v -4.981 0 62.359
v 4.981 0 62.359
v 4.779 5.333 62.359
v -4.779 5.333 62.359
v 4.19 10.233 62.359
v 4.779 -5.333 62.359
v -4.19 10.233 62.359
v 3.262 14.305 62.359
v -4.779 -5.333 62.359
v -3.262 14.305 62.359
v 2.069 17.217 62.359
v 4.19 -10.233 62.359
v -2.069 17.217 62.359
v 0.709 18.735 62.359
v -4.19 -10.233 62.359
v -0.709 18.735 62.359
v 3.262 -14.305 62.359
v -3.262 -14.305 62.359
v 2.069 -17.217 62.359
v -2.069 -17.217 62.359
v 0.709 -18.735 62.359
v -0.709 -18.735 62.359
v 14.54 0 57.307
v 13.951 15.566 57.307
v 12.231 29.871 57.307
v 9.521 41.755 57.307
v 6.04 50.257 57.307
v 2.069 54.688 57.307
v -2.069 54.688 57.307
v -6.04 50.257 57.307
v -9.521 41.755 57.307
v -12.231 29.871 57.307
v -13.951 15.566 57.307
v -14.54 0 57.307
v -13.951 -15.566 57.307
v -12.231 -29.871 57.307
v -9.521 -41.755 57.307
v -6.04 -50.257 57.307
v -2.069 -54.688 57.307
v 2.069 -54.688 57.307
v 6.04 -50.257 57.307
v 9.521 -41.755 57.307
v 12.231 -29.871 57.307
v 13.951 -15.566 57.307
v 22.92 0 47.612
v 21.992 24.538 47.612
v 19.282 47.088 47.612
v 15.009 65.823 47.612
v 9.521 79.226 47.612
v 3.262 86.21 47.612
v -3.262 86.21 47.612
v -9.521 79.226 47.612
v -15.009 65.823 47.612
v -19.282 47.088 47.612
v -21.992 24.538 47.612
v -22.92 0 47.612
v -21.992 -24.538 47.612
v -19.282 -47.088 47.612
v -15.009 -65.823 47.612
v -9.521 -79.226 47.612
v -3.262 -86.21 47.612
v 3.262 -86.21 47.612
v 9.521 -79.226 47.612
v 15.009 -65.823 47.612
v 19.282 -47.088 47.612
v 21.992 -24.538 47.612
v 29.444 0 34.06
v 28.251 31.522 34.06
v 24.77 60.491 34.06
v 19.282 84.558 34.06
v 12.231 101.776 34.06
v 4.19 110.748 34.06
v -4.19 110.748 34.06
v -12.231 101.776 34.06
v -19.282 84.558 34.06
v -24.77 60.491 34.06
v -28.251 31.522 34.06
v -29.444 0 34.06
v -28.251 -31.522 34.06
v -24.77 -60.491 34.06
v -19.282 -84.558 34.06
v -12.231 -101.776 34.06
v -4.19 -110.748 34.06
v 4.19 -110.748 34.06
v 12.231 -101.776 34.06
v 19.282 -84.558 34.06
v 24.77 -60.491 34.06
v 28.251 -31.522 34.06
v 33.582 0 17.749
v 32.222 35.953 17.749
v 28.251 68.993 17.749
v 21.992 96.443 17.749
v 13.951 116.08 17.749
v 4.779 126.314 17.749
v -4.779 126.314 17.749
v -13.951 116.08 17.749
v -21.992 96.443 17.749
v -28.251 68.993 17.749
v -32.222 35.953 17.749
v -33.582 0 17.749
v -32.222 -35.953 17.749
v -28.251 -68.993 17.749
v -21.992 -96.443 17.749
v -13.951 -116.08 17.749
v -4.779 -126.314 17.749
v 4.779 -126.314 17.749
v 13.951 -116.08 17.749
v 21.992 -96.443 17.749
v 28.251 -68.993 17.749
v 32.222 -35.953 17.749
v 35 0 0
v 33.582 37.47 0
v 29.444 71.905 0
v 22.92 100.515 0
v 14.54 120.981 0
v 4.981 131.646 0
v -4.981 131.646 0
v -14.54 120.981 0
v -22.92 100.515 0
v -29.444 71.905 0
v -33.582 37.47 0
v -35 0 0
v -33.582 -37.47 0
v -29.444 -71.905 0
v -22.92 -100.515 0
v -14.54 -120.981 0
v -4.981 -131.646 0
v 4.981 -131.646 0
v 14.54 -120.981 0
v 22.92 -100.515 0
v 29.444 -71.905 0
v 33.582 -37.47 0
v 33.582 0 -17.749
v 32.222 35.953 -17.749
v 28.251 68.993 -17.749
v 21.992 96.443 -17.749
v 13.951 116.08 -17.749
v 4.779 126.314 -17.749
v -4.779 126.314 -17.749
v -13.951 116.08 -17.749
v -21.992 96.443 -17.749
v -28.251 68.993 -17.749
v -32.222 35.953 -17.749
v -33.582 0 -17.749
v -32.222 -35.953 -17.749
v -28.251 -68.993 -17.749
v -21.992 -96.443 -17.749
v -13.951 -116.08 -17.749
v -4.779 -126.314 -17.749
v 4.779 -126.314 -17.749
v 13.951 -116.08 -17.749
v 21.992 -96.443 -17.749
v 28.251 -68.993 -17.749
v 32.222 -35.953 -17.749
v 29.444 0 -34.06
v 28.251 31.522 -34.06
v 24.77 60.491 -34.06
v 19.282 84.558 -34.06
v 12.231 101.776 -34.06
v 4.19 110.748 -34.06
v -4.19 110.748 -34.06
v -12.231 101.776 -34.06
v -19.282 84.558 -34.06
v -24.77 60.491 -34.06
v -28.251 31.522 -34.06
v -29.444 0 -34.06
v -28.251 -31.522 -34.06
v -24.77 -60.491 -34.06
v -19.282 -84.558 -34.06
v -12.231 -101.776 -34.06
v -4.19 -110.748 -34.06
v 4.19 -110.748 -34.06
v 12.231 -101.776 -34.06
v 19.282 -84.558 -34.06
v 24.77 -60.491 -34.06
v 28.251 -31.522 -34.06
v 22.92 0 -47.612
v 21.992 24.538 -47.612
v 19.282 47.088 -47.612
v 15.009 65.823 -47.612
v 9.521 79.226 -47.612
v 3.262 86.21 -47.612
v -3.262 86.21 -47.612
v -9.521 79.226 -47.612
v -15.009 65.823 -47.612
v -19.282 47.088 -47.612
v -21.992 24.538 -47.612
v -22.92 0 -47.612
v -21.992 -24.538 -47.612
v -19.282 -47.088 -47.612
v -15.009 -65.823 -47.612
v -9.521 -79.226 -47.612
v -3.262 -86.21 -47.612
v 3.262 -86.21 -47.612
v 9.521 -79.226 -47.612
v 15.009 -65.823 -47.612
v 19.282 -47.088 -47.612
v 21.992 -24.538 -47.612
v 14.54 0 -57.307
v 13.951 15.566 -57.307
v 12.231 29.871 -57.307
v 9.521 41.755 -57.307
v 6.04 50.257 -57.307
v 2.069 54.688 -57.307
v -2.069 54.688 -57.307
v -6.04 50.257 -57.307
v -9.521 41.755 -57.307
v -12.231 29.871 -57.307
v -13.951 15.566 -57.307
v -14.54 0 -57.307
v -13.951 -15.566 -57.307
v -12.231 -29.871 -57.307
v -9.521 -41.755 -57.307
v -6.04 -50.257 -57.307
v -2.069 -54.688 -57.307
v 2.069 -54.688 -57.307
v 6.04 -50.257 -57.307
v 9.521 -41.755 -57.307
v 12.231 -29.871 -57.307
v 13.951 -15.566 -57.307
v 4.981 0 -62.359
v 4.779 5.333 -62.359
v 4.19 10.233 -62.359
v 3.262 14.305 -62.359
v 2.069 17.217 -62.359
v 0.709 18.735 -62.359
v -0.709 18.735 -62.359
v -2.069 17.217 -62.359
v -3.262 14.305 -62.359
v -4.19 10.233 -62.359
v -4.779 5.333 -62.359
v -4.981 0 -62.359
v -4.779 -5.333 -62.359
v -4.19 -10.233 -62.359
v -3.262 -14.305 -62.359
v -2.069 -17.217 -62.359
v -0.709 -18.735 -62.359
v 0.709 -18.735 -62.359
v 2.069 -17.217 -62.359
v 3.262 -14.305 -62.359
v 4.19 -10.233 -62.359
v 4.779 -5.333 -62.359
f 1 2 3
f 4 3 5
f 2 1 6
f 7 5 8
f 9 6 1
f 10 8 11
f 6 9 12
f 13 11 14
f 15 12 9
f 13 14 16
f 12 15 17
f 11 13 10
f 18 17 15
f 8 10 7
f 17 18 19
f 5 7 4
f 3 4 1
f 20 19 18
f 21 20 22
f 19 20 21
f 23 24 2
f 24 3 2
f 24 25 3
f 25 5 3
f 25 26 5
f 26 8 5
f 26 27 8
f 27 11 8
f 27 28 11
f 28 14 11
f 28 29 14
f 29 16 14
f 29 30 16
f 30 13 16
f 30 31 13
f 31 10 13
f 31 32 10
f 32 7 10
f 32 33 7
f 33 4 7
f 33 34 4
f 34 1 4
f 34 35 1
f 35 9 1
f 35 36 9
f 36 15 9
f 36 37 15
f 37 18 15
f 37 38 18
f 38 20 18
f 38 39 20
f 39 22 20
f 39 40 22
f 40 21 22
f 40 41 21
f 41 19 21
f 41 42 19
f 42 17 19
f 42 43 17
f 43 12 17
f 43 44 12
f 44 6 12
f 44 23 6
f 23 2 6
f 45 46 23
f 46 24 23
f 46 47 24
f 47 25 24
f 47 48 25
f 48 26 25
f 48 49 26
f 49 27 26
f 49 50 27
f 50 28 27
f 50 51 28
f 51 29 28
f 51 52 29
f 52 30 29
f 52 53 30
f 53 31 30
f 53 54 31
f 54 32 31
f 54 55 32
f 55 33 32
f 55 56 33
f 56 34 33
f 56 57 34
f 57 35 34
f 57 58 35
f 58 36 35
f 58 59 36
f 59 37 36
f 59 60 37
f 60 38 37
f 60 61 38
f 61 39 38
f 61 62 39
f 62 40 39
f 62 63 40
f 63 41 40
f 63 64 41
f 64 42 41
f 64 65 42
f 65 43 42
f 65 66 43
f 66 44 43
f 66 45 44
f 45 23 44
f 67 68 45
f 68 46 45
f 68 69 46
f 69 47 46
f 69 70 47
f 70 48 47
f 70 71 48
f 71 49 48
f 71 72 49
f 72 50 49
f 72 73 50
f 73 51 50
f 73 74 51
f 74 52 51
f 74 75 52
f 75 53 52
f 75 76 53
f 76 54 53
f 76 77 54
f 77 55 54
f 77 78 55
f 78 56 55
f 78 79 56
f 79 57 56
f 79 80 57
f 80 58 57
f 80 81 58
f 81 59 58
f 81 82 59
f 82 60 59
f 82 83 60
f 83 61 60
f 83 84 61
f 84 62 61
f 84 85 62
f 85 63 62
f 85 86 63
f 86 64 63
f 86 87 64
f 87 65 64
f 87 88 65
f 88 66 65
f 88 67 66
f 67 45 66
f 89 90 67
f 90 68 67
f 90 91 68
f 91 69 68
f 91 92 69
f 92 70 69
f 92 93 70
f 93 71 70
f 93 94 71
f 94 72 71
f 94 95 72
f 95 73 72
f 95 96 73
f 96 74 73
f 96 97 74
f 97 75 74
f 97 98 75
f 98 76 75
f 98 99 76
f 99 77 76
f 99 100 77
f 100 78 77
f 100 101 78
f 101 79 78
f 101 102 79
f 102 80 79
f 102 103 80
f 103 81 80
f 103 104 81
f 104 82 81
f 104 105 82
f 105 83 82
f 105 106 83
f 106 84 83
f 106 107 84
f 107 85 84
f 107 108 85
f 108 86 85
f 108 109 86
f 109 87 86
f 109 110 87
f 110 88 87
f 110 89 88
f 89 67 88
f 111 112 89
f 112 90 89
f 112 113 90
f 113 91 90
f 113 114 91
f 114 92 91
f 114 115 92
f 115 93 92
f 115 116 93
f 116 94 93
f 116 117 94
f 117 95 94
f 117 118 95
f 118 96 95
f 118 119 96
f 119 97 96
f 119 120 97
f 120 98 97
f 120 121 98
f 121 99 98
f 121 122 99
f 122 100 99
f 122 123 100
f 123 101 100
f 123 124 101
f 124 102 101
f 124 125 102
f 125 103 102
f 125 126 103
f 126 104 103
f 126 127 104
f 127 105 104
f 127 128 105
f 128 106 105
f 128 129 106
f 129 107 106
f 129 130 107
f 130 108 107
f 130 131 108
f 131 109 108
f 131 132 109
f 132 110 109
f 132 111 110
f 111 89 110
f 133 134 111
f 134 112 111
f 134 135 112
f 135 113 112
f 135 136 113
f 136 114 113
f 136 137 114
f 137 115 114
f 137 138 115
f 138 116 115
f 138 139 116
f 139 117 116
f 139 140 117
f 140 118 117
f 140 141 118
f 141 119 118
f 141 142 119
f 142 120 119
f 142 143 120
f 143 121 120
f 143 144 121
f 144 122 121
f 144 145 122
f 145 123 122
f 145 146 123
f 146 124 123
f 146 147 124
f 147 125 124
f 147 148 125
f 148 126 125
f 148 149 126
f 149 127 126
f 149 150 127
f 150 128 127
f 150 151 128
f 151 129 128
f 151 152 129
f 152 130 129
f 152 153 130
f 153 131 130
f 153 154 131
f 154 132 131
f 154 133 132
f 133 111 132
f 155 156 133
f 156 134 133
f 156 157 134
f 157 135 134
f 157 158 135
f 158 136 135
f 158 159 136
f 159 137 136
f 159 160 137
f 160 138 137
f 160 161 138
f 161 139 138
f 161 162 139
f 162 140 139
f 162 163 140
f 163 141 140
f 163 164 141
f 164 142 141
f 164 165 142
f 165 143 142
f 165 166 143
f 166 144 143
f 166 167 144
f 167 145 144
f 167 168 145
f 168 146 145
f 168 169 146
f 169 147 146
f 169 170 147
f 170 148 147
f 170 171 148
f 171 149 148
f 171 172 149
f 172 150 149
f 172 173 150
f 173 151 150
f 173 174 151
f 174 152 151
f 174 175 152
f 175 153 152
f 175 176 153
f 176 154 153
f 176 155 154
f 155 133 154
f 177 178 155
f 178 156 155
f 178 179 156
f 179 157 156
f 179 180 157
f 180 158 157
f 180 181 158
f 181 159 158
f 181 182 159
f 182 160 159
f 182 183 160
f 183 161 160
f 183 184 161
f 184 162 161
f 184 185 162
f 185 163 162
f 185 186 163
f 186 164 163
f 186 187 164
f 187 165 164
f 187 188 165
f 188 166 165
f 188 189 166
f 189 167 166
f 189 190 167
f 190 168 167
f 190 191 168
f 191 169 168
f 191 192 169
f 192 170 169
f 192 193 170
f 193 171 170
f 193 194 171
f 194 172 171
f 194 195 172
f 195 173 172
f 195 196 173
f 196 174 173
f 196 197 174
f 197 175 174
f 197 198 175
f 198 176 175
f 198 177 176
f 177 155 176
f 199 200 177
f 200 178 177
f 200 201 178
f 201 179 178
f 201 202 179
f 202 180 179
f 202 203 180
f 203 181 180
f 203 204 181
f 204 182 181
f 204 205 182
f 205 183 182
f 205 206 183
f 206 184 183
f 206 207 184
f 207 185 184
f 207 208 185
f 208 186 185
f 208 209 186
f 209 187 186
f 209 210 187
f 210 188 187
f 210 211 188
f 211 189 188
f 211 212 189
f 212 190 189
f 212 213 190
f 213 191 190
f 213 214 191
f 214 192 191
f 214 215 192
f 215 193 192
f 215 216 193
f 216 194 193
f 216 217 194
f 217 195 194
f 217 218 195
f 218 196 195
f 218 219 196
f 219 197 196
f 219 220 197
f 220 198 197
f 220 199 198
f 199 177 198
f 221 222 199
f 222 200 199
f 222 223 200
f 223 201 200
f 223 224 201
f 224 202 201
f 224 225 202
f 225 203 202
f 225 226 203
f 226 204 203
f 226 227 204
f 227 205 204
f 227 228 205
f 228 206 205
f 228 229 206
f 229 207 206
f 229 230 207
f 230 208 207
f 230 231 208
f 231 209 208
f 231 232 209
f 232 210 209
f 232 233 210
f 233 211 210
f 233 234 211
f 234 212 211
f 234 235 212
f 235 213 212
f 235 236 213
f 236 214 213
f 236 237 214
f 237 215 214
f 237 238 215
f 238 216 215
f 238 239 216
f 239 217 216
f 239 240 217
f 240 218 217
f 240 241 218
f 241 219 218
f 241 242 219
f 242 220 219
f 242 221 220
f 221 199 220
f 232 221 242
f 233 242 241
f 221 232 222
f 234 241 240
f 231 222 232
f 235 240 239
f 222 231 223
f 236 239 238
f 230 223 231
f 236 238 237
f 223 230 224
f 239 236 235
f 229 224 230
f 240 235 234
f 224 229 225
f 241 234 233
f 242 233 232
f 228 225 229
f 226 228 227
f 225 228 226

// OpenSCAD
// Generated by SolidPython 1.0.1 on 2020-07-29 00:46:47


scale(v = [5, 19, 9]) {
	sphere(r = 7);
}
/***********************************************
*********      SolidPython code:      **********
************************************************
 
# import packages: SolidPython
from solid import *
from solid.utils import *
from itertools import chain, combinations, permutations


class Resize:

    def __init__(self, scad_file):
        self.scad_file = scad_file
        #self.scad_file = import_scad(scad_file)
        # cone/cylinder param:
        self.r1 = 0
        self.r2 = 0
        self.h = 0
        # rectangular prism param:
        self.w = 0
        self.l = 0
        # ellipse param:
        self.r = 0

    # import OpenScad code (file name corresponds to shape)


    # classify shape + parameters
    def assign(self, param1, param2, param3):
        if self.scad_file == 'cone.scad':
            self.r1 = param1
            self.r2 = param2
            self.h = param3
        elif self.scad_file == 'cylinder.scad':
            self.r1 = param1
            self.r2 = param2
            self.h = param3
        elif self.scad_file == 'rectangularPrism.scad':
            self.h = param1
            self.l = param2
            self.w = param3
        else:
            self.r = param1
            self.h = param2

    # resize parameters
    def iterate(self):
        x = range(3, 20, 2)
        i = 1
        if self.scad_file == 'cone.scad':
            tempList = list(permutations(x, 2))
            for temp in tempList:
                param1 = temp[0]
                param2 = temp[1]
                filepath = 'produced_scad_files/' + 'cone' + str(param1) + '_' + str(param2) + '_' + '.scad'
                scad_render_to_file(cylinder(h=param1, r1=param2, r2=0), filepath)

        elif self.scad_file == 'cylinder.scad':
            tempList = list(permutations(x, 3))
            for temp in tempList:
                param1 = temp[0]
                param2 = temp[1]
                filepath = 'produced_scad_files/' + 'cylinder' + str(param1) + '_' + str(param2) + '_' + '.scad'
                scad_render_to_file(cylinder(h=param1, r1=param2, r2=param2), filepath)

        elif self.scad_file == 'rectangularPrism.scad':
            tempList = list(permutations(x, 3))
            for temp in tempList:
                param1 = temp[0]
                param2 = temp[1]
                param3 = temp[2]
                filepath = 'produced_scad_files/' + 'rectangularPrism' + str(param1) + '_' + str(param2) + '_' + str(
                    param3) + '.scad'
                scad_render_to_file(cube(size=(param1, param2, param3)), filepath)

        elif self.scad_file == 'ellipse.scad':
            tempList = list(permutations(x, 4))
            for temp in tempList:
                param1 = temp[0]
                param2 = temp[1]
                param3 = temp[2]
                param4 = temp[3]
                filepath = 'produced_scad_files/' + 'ellipse' + str(param1) + '_' + str(param2) + '_' + str(param3) + '_' + str(param4) + '.scad'
                scad_render_to_file(scale([param1, param2, param3])(sphere(r=param4)), filepath)

    def render_to_scadfile(self):
        scad_render_to_file(scad, 'example.scad') 
 
************************************************/
